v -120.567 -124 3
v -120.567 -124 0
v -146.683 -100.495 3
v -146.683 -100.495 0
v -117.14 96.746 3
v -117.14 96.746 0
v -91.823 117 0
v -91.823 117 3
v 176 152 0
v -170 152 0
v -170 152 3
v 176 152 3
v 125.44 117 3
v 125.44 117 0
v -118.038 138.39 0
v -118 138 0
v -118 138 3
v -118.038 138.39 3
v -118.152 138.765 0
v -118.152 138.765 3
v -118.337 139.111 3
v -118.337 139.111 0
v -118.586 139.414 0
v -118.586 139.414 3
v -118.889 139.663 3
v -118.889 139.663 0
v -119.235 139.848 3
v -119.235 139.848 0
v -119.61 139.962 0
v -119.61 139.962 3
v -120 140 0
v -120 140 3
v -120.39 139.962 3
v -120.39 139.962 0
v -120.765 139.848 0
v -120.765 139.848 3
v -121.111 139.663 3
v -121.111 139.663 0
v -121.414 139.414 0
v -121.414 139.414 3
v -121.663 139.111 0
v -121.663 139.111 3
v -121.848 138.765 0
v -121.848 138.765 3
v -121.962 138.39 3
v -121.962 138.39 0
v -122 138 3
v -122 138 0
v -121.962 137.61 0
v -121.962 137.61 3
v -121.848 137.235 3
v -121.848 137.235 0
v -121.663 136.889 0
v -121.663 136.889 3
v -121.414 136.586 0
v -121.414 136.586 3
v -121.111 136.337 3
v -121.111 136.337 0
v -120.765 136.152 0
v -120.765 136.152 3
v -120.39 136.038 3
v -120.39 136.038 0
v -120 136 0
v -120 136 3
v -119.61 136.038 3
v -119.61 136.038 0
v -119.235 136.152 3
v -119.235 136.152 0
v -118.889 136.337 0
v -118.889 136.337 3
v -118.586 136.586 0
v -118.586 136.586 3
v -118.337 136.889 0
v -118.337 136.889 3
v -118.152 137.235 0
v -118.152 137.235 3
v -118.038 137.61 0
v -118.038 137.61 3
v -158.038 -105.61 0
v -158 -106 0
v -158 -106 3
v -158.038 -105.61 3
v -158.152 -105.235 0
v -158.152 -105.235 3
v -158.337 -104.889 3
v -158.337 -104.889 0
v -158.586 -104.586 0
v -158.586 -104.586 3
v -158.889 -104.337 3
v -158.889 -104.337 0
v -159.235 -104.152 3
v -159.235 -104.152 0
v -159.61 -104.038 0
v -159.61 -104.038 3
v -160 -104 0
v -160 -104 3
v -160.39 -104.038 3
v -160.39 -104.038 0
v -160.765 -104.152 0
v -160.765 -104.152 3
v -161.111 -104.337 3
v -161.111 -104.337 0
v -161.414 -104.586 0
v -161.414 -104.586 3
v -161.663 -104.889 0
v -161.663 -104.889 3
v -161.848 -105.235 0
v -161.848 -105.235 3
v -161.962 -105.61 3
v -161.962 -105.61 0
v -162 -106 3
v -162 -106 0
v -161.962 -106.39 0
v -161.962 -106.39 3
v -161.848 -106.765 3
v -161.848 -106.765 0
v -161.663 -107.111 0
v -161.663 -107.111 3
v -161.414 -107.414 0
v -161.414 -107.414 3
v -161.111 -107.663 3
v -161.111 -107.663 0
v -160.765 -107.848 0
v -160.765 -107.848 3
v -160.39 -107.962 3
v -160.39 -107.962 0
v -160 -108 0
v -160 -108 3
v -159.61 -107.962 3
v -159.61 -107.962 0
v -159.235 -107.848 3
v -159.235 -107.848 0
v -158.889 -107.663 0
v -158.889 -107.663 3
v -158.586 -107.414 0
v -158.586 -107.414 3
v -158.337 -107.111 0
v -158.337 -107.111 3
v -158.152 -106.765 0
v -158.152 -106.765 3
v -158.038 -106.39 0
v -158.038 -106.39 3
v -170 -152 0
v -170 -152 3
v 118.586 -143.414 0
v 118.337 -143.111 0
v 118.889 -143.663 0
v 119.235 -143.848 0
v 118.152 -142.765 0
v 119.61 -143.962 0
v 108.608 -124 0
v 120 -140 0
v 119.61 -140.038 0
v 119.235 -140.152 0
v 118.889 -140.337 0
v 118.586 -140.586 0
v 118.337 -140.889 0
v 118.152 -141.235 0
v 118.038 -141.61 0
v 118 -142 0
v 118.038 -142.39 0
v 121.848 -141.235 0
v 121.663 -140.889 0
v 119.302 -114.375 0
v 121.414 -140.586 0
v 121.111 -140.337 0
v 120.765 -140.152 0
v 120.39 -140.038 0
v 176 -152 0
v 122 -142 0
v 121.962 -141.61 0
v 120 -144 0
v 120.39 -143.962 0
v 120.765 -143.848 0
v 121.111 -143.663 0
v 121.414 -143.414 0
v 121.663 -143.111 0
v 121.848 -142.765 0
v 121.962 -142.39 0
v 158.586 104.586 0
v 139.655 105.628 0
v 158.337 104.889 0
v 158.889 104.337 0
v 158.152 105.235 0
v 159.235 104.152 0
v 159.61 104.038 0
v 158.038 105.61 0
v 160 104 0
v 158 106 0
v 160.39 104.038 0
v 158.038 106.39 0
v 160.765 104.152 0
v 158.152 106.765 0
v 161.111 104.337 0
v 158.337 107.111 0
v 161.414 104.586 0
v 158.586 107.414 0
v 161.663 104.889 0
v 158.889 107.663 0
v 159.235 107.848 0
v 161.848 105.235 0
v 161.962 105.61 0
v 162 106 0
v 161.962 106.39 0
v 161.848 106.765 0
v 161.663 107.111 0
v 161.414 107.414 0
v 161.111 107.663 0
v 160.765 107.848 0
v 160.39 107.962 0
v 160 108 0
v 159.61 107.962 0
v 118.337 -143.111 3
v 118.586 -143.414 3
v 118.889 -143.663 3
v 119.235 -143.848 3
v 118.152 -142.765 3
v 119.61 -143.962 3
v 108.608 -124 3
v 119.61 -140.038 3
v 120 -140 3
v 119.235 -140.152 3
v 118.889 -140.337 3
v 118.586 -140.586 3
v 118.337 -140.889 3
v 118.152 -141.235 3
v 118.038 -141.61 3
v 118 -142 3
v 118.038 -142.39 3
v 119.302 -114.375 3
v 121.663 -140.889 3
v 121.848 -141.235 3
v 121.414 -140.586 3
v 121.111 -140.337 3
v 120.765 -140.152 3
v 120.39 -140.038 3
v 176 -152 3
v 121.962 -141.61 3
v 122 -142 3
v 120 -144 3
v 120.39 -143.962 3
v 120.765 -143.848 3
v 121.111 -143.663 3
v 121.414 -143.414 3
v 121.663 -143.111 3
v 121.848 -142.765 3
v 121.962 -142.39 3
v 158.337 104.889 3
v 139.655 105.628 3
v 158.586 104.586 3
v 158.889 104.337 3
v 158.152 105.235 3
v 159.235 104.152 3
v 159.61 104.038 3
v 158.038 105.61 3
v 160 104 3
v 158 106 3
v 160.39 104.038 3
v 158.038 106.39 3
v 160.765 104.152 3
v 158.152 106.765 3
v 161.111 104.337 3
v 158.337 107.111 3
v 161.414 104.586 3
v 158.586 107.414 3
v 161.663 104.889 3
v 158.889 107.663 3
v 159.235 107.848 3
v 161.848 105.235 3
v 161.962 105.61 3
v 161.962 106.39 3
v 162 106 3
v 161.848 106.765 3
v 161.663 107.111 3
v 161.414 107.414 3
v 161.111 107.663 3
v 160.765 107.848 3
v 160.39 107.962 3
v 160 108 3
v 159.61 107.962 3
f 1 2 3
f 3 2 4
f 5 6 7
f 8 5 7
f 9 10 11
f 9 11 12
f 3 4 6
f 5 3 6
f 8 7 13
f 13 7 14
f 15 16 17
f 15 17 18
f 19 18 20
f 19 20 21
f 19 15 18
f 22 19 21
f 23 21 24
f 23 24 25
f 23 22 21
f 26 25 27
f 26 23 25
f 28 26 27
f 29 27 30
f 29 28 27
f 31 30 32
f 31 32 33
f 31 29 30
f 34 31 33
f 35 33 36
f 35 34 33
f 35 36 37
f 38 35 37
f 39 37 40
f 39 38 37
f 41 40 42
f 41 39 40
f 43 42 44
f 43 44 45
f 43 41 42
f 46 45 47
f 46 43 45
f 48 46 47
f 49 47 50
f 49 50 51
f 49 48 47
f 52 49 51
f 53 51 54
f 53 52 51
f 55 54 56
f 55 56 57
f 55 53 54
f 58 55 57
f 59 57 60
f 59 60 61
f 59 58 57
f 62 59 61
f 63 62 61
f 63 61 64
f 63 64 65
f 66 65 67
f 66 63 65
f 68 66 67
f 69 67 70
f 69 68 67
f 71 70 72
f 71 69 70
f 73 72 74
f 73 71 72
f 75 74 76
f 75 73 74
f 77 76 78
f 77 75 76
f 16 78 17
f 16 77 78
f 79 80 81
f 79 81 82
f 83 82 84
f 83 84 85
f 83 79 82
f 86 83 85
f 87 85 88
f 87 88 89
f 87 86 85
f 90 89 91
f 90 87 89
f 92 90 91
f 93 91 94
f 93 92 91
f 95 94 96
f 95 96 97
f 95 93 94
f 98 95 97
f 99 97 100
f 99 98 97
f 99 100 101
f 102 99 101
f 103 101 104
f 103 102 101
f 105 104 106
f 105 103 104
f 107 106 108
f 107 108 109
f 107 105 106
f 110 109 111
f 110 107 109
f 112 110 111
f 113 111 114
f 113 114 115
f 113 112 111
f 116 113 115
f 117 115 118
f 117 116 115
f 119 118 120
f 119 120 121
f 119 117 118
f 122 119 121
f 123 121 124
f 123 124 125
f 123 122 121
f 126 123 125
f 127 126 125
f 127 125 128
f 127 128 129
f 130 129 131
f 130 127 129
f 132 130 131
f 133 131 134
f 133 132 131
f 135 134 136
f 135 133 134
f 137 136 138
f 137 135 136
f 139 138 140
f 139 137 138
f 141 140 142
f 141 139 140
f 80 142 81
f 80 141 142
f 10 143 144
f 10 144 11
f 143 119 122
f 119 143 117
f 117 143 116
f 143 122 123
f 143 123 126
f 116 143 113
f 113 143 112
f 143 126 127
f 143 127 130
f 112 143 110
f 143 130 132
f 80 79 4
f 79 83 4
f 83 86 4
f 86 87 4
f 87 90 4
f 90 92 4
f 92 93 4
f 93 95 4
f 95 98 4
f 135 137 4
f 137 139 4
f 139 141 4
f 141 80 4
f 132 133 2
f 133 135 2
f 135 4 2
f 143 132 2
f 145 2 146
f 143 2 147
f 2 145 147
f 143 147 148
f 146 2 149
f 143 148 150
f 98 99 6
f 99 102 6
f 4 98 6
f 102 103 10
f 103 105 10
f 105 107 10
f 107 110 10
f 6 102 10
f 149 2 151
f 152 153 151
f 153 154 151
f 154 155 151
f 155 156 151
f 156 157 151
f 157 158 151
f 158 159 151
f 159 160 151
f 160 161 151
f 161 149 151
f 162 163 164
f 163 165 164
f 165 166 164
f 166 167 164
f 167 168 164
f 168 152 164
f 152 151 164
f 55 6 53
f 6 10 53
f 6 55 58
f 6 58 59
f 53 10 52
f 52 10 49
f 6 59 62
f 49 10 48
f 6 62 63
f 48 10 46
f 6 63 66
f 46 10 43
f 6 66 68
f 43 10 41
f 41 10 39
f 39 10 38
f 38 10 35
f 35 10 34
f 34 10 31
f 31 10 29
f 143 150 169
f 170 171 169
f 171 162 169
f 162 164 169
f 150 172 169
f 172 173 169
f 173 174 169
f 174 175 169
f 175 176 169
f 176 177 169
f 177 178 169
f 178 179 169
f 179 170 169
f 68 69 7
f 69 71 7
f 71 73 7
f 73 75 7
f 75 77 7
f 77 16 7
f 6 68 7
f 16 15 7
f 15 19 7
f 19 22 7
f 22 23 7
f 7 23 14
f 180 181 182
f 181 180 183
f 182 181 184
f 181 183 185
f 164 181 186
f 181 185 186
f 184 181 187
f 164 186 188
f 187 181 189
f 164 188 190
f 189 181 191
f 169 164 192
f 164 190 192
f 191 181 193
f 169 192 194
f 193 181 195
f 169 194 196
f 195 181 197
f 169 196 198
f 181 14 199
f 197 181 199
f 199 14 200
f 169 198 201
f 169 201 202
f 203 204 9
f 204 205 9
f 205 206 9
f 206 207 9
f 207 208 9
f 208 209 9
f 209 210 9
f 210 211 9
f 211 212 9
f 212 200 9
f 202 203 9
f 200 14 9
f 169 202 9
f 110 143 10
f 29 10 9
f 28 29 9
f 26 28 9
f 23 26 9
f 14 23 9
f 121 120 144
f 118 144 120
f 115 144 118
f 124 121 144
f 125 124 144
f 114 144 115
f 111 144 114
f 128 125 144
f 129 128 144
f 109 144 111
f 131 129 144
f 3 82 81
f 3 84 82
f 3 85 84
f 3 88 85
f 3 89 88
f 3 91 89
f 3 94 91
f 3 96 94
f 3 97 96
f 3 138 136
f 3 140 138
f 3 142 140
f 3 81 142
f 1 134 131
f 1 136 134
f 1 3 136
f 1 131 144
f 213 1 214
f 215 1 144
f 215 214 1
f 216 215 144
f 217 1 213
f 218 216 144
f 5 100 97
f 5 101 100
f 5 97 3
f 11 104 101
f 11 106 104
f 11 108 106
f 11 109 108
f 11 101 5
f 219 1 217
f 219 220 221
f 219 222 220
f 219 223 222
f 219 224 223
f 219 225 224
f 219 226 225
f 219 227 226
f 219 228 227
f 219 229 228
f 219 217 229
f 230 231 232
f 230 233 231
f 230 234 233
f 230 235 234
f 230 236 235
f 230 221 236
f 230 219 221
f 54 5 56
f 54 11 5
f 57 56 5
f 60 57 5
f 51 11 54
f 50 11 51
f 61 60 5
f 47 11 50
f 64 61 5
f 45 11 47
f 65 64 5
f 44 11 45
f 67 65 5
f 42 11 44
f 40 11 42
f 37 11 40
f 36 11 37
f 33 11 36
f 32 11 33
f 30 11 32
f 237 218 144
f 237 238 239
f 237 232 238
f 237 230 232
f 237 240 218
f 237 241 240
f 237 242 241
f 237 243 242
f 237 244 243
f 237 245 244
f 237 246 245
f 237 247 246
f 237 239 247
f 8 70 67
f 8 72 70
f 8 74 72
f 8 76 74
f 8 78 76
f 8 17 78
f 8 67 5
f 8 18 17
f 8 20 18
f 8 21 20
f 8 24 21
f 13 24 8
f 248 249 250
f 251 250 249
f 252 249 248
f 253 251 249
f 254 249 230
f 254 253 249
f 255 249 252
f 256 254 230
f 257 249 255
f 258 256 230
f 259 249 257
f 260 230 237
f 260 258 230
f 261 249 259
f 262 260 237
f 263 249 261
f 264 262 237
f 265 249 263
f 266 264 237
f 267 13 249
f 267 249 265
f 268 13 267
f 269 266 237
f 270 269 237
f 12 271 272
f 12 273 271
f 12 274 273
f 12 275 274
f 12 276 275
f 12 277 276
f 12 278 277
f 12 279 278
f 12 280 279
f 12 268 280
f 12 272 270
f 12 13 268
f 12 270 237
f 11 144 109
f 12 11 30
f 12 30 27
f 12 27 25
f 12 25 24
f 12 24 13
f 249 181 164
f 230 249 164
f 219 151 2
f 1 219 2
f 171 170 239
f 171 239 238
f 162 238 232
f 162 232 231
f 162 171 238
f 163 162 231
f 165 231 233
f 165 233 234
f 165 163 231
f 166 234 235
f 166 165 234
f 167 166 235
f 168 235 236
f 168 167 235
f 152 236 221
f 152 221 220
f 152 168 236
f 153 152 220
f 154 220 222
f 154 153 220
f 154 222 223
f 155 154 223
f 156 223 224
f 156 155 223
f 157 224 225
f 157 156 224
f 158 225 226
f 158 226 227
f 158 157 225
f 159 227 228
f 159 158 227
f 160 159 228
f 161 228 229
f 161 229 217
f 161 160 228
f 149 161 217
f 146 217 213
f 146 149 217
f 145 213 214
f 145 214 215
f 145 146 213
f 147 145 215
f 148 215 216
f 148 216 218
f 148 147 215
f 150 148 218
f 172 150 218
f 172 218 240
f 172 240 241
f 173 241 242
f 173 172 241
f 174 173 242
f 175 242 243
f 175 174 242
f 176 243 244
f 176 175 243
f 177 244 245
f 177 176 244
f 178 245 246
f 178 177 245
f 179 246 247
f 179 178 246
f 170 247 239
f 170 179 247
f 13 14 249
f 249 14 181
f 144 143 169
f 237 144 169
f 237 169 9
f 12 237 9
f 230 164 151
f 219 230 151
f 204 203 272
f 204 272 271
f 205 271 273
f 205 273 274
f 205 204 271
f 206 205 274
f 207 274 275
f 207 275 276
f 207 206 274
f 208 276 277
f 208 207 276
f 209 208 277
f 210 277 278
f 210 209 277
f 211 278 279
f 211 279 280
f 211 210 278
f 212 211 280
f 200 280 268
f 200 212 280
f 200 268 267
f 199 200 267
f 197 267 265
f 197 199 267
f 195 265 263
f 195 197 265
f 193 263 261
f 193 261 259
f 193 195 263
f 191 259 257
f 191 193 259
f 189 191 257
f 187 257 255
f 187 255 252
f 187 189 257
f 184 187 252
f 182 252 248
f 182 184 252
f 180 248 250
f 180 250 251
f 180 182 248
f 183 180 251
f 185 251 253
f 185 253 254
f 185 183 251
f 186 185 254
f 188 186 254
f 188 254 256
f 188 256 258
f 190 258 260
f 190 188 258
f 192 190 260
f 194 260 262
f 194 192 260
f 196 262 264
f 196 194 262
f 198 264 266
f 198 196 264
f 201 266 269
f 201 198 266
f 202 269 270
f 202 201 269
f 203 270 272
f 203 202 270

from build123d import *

# Parameters (mm, degrees)
SKETCH1_W           = 346
SKETCH1_H           = 304
SKETCH1_R           = 2
BOSS_EXTRUDE1_DEPTH = 3


with BuildPart() as part:
    # Sketch1 → Boss-Extrude1 (new body)
    with BuildSketch(Plane.XY):
        with Locations((3, 0)):
            Rectangle(SKETCH1_W, SKETCH1_H)
        with Locations((-160, -106)):
            Circle(SKETCH1_R, mode=Mode.SUBTRACT)
        with Locations((120, -142)):
            Circle(SKETCH1_R, mode=Mode.SUBTRACT)
        Polygon((139.655171099, 105.627740104), (119.302480143, -114.375157373), (108.608210557, -124), (-120.566987488, -124), (-146.683245886, -100.495367441), (-117.140423658, 96.746416259), (-91.823443982, 117), (125.439846228, 117), align=None, mode=Mode.SUBTRACT)
        with Locations((-120, 138)):
            Circle(SKETCH1_R, mode=Mode.SUBTRACT)
        with Locations((160, 106)):
            Circle(SKETCH1_R, mode=Mode.SUBTRACT)
    extrude(amount=BOSS_EXTRUDE1_DEPTH)


solid = part.part
